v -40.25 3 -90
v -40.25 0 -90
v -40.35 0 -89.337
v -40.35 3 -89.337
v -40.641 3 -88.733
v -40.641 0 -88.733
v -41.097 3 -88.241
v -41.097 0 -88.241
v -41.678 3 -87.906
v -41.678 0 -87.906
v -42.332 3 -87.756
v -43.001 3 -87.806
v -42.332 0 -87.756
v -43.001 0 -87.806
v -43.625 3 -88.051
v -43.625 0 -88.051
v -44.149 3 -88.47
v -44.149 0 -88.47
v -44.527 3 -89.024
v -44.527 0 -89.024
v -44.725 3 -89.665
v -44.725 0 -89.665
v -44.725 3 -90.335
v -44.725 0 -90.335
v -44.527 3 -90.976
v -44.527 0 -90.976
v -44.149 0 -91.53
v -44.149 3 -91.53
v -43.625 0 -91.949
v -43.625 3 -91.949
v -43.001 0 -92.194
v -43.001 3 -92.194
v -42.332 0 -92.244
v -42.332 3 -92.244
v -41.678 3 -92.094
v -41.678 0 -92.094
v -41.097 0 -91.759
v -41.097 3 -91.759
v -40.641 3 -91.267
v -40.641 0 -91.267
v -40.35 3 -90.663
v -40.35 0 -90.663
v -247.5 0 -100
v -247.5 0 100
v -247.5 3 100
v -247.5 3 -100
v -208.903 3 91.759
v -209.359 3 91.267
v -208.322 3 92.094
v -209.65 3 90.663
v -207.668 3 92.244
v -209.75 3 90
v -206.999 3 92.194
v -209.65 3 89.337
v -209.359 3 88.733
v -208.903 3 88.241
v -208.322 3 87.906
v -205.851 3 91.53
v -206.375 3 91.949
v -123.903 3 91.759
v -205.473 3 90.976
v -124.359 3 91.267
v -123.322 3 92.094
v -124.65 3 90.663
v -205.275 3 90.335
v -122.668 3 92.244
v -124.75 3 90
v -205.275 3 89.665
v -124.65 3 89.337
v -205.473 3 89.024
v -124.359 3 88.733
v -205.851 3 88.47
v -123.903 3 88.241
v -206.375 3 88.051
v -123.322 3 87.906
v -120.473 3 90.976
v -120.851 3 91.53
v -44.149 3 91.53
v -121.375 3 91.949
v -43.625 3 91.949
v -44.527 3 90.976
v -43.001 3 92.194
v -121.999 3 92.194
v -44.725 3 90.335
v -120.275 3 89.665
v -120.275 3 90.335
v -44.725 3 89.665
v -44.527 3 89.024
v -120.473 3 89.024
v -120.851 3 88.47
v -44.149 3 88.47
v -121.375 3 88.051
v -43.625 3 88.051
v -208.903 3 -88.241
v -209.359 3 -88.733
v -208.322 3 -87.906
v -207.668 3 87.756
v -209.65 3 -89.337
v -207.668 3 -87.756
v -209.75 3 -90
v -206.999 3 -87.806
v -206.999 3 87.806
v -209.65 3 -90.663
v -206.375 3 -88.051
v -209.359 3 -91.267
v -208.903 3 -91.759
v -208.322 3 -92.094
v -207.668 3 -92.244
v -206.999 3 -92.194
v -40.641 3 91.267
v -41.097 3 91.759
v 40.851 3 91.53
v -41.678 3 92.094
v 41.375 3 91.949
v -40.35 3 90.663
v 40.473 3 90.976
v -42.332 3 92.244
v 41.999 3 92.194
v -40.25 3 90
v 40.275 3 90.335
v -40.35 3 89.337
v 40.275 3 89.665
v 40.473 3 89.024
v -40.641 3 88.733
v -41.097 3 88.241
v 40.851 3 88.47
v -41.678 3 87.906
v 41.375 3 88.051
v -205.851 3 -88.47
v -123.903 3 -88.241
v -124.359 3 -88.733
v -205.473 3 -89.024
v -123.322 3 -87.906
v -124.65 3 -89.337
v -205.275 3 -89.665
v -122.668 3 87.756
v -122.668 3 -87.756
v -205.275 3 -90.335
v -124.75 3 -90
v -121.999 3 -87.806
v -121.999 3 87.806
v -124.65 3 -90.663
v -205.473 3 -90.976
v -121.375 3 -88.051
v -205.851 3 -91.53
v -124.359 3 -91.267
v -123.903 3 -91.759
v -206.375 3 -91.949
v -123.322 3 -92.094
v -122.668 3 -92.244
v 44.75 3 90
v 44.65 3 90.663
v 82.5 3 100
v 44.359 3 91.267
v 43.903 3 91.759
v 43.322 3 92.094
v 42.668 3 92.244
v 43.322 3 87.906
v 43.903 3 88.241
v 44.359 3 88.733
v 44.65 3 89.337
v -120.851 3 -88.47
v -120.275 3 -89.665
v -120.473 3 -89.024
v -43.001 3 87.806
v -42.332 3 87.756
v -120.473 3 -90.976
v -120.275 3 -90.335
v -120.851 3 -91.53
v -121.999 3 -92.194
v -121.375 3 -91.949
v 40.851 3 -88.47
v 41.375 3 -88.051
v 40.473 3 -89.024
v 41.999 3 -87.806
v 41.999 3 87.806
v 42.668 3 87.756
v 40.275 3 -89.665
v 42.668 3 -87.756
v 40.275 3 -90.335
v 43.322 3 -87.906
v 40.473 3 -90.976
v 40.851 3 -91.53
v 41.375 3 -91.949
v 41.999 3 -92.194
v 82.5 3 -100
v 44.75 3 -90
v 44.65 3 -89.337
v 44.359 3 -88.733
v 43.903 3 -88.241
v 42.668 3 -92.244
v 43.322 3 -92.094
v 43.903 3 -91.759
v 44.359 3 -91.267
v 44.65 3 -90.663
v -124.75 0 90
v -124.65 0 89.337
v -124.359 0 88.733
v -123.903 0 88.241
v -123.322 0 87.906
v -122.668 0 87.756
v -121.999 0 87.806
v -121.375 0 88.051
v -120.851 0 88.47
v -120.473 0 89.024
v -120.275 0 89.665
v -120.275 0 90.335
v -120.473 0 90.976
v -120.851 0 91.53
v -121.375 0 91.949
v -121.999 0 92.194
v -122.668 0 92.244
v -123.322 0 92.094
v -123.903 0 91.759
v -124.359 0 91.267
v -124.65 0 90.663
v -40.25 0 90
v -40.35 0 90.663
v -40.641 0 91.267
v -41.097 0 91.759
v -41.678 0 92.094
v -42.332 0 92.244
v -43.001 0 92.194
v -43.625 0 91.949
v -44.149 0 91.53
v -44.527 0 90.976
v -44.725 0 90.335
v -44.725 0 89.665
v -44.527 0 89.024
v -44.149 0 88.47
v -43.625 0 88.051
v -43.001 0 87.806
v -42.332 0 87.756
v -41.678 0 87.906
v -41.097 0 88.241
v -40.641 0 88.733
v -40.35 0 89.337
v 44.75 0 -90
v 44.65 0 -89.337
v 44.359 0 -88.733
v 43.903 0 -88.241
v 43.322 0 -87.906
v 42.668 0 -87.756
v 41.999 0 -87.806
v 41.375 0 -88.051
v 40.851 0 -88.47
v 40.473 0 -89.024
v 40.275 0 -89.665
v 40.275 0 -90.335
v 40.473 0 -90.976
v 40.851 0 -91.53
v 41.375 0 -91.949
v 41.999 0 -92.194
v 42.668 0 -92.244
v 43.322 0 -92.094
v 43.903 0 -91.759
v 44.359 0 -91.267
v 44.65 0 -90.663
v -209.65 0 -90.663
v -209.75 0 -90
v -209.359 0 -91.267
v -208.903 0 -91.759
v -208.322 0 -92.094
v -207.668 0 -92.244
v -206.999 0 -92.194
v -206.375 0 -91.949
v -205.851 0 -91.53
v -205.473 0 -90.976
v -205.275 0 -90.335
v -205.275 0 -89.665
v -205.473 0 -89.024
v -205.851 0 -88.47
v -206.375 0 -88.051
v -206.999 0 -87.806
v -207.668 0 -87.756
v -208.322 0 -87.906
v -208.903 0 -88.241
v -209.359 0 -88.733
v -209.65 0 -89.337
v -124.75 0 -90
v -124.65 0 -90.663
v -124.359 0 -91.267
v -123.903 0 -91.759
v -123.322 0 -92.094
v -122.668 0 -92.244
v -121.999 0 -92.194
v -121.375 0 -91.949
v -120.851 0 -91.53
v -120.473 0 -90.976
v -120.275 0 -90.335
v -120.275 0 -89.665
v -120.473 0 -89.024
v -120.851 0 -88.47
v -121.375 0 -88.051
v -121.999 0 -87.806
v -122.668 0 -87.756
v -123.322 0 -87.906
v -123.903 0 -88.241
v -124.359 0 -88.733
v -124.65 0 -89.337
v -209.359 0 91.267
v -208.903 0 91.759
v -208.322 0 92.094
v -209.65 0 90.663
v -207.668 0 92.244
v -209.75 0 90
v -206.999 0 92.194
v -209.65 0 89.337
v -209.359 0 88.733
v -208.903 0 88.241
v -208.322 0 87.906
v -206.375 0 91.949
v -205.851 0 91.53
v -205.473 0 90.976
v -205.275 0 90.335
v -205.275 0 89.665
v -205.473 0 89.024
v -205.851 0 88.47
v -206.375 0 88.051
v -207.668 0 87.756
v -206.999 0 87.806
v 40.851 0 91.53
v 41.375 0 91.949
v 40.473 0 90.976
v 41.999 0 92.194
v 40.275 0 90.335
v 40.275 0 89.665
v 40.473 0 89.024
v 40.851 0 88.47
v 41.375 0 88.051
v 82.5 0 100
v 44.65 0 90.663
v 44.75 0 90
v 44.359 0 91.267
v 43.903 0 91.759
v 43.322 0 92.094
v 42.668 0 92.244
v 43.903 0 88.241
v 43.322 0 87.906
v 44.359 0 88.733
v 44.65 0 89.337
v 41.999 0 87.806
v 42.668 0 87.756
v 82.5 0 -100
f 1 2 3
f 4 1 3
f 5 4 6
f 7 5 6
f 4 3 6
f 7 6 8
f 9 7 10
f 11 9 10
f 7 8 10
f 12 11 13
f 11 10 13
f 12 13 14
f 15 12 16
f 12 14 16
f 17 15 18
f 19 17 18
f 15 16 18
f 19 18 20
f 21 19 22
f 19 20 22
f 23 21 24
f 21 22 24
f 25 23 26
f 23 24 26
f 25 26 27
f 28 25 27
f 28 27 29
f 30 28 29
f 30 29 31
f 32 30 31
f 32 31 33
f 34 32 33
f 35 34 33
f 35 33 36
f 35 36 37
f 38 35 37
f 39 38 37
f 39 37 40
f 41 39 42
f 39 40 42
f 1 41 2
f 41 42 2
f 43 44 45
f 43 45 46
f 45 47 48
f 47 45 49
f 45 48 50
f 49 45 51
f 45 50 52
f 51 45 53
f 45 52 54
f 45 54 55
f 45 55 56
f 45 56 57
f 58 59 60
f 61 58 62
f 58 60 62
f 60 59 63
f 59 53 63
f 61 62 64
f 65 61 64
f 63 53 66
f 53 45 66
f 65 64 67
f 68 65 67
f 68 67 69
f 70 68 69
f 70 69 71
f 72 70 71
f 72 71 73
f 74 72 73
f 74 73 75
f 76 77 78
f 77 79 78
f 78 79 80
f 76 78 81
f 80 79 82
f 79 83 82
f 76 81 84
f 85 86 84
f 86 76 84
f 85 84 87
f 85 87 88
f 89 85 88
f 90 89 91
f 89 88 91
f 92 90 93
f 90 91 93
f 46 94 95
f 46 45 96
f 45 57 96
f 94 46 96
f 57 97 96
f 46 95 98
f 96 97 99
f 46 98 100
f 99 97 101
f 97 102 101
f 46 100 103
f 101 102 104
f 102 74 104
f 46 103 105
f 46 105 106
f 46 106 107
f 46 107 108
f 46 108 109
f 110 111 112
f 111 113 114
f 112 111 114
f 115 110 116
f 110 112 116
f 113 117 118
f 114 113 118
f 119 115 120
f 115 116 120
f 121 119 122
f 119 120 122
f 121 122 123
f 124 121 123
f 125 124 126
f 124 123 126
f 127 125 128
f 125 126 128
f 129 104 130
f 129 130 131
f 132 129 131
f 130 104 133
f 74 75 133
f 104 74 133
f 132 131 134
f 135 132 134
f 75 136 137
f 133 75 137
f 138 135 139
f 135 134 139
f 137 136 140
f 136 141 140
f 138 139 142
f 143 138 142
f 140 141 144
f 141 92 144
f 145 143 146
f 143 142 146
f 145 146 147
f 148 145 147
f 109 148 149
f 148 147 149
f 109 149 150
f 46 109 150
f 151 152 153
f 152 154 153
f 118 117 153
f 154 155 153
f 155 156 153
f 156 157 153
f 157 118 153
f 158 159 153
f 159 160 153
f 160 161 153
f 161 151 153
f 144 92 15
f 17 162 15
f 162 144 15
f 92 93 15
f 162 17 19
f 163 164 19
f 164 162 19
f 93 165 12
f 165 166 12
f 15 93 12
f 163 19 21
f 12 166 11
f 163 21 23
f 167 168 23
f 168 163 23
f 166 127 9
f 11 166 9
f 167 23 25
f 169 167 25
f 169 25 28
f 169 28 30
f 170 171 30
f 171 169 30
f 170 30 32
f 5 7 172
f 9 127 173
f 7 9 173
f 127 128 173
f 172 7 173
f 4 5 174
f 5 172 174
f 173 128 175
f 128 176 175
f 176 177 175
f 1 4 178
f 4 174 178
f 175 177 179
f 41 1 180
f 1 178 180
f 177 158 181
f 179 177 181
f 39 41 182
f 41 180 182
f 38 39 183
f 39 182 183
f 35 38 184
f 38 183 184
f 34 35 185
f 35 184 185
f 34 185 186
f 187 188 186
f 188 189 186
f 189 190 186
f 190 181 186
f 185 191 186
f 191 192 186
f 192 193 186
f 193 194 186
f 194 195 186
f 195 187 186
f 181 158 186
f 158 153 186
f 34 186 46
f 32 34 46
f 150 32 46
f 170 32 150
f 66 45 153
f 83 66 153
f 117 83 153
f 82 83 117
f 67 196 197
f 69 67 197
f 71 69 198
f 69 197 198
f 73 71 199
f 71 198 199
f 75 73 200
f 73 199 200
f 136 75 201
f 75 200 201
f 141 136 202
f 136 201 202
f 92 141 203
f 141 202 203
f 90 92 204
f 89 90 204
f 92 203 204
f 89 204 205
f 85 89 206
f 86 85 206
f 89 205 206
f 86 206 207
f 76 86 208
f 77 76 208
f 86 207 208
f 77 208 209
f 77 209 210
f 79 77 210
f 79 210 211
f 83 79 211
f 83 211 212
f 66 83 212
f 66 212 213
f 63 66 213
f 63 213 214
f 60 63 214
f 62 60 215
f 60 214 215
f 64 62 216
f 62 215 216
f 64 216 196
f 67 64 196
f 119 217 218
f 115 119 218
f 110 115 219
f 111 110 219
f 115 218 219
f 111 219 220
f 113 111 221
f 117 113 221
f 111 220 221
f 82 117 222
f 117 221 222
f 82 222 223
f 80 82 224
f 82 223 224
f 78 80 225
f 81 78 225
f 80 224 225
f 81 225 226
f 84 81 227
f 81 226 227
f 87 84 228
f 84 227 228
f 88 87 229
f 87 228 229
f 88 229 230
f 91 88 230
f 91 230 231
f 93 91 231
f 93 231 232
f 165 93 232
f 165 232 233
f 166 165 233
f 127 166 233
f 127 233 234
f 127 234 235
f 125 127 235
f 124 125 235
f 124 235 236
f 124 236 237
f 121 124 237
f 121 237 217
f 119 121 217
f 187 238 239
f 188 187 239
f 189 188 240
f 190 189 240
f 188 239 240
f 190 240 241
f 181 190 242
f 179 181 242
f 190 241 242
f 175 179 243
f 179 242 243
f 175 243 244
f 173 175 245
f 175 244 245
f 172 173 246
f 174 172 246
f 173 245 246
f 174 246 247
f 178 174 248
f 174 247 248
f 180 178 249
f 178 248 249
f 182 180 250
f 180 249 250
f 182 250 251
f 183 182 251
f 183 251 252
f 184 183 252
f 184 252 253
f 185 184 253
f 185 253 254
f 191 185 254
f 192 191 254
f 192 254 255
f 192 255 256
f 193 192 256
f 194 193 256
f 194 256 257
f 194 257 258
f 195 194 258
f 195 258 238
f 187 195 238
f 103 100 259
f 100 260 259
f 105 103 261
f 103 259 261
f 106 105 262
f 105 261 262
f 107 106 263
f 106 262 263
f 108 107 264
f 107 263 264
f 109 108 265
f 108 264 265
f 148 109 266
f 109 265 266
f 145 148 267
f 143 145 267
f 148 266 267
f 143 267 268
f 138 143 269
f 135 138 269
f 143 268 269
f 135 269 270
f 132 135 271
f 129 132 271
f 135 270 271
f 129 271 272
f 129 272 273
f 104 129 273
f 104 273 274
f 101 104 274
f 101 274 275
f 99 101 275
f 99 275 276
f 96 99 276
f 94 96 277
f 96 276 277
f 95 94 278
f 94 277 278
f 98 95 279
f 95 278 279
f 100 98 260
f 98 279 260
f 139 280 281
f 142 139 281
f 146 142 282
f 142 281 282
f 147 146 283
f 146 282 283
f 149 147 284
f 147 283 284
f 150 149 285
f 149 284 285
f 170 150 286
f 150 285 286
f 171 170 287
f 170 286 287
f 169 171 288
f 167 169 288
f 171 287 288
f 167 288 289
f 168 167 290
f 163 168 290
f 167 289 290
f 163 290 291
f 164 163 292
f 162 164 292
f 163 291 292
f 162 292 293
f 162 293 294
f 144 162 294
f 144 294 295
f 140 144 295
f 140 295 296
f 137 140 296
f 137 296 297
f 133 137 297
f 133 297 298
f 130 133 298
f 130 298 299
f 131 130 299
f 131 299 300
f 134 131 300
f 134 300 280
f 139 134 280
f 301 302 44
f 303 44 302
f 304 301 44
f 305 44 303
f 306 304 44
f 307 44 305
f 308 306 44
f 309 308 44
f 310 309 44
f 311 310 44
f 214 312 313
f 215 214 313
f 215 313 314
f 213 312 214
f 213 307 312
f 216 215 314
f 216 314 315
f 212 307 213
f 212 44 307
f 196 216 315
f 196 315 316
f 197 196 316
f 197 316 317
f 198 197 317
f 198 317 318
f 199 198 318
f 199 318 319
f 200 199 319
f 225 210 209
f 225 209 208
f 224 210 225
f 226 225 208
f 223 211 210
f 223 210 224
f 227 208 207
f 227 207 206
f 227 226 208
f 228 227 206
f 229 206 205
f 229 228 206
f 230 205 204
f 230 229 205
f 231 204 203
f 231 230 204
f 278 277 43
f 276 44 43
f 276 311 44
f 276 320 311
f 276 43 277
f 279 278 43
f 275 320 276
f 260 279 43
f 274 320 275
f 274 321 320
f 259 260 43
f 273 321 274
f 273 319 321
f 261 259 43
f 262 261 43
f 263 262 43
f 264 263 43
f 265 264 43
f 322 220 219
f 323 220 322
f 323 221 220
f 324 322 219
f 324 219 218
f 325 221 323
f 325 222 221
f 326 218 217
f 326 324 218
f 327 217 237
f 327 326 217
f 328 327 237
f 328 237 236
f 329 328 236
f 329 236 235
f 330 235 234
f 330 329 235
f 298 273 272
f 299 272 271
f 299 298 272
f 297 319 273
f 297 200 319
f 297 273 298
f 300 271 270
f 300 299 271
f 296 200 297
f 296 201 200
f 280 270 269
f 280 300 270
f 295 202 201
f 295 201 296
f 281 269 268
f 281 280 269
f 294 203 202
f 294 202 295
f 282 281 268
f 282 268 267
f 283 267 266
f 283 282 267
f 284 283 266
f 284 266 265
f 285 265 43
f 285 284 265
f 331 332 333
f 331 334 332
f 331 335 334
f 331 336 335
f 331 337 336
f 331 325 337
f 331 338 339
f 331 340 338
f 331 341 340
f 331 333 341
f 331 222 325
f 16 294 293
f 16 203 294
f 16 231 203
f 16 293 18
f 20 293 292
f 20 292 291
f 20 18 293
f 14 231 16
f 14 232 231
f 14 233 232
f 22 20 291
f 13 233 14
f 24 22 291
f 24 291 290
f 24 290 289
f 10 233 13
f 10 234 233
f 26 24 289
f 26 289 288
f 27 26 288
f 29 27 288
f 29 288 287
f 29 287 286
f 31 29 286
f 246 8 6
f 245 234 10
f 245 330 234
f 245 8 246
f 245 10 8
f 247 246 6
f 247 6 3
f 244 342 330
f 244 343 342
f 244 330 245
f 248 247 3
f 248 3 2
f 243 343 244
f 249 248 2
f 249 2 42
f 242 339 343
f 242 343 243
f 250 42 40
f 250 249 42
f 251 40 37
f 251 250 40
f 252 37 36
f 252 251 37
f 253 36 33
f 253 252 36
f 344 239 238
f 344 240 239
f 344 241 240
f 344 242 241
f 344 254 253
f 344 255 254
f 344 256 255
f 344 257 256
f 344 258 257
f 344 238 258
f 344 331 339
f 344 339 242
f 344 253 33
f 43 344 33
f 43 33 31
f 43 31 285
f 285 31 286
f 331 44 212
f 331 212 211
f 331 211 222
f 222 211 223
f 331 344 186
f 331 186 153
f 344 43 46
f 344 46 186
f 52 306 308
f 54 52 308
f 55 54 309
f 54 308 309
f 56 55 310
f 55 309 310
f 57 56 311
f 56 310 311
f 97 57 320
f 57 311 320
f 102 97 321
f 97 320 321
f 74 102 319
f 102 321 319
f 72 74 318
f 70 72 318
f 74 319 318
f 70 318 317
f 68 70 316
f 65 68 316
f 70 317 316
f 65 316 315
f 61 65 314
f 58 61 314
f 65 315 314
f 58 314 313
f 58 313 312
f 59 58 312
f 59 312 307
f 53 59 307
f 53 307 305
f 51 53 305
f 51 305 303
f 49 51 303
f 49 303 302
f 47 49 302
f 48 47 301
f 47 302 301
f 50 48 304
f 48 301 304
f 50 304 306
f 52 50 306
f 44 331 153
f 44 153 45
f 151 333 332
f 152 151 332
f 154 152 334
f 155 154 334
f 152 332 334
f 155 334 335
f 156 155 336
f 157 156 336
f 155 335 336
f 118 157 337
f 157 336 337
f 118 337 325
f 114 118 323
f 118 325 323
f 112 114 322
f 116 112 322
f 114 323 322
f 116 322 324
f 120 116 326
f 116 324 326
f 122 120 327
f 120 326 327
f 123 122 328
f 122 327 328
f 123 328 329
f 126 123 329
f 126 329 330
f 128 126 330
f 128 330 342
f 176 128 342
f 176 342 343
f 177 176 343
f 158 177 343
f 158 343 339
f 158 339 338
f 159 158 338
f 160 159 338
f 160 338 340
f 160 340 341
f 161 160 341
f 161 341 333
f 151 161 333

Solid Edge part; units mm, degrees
sketch "Sketch1" plane through (0, 0, 0) normal (0, -1, 0) x (1, 0, 0)
  line L0 (-82.5, -100) -> (82.5, -100)
  line L1 (82.5, -100) -> (82.5, 100)
  line L2 (82.5, 100) -> (-82.5, 100)
  line L3 (-82.5, 100) -> (-82.5, -100)
  dimension "D1" = 200
  dimension "D2" = 165
extrude "Protrusion1" add sketch "Sketch1" against normal blind 3
sketch "Sketch2" plane through (0, 0, 0) normal (0, -1, 0) x (1, 0, 0)
  circle A0 centre (-42.5, 90) radius 2.25
  circle A1 centre (42.5, 90) radius 2.25
  dimension "D1" = 85
  dimension "D2" = 10
  dimension "D3" = 4.5
extrude "Cutout1" cut sketch "Sketch2" against normal through all
sketch "Sketch3" plane through (0, 0, 0) normal (0, -1, 0) x (1, 0, 0)
  circle A0 centre (42.5, -90) radius 2.25
  circle A1 centre (-42.5, -90) radius 2.25
extrude "Cutout2" cut sketch "Sketch3" against normal through all
mirror "Mirror1" about plane through (-82.5, 1.5, 0) normal (-1, 0, 0) of "Protrusion1", "Cutout1", "Cutout2"
properties material "Acryl, hochfest"
